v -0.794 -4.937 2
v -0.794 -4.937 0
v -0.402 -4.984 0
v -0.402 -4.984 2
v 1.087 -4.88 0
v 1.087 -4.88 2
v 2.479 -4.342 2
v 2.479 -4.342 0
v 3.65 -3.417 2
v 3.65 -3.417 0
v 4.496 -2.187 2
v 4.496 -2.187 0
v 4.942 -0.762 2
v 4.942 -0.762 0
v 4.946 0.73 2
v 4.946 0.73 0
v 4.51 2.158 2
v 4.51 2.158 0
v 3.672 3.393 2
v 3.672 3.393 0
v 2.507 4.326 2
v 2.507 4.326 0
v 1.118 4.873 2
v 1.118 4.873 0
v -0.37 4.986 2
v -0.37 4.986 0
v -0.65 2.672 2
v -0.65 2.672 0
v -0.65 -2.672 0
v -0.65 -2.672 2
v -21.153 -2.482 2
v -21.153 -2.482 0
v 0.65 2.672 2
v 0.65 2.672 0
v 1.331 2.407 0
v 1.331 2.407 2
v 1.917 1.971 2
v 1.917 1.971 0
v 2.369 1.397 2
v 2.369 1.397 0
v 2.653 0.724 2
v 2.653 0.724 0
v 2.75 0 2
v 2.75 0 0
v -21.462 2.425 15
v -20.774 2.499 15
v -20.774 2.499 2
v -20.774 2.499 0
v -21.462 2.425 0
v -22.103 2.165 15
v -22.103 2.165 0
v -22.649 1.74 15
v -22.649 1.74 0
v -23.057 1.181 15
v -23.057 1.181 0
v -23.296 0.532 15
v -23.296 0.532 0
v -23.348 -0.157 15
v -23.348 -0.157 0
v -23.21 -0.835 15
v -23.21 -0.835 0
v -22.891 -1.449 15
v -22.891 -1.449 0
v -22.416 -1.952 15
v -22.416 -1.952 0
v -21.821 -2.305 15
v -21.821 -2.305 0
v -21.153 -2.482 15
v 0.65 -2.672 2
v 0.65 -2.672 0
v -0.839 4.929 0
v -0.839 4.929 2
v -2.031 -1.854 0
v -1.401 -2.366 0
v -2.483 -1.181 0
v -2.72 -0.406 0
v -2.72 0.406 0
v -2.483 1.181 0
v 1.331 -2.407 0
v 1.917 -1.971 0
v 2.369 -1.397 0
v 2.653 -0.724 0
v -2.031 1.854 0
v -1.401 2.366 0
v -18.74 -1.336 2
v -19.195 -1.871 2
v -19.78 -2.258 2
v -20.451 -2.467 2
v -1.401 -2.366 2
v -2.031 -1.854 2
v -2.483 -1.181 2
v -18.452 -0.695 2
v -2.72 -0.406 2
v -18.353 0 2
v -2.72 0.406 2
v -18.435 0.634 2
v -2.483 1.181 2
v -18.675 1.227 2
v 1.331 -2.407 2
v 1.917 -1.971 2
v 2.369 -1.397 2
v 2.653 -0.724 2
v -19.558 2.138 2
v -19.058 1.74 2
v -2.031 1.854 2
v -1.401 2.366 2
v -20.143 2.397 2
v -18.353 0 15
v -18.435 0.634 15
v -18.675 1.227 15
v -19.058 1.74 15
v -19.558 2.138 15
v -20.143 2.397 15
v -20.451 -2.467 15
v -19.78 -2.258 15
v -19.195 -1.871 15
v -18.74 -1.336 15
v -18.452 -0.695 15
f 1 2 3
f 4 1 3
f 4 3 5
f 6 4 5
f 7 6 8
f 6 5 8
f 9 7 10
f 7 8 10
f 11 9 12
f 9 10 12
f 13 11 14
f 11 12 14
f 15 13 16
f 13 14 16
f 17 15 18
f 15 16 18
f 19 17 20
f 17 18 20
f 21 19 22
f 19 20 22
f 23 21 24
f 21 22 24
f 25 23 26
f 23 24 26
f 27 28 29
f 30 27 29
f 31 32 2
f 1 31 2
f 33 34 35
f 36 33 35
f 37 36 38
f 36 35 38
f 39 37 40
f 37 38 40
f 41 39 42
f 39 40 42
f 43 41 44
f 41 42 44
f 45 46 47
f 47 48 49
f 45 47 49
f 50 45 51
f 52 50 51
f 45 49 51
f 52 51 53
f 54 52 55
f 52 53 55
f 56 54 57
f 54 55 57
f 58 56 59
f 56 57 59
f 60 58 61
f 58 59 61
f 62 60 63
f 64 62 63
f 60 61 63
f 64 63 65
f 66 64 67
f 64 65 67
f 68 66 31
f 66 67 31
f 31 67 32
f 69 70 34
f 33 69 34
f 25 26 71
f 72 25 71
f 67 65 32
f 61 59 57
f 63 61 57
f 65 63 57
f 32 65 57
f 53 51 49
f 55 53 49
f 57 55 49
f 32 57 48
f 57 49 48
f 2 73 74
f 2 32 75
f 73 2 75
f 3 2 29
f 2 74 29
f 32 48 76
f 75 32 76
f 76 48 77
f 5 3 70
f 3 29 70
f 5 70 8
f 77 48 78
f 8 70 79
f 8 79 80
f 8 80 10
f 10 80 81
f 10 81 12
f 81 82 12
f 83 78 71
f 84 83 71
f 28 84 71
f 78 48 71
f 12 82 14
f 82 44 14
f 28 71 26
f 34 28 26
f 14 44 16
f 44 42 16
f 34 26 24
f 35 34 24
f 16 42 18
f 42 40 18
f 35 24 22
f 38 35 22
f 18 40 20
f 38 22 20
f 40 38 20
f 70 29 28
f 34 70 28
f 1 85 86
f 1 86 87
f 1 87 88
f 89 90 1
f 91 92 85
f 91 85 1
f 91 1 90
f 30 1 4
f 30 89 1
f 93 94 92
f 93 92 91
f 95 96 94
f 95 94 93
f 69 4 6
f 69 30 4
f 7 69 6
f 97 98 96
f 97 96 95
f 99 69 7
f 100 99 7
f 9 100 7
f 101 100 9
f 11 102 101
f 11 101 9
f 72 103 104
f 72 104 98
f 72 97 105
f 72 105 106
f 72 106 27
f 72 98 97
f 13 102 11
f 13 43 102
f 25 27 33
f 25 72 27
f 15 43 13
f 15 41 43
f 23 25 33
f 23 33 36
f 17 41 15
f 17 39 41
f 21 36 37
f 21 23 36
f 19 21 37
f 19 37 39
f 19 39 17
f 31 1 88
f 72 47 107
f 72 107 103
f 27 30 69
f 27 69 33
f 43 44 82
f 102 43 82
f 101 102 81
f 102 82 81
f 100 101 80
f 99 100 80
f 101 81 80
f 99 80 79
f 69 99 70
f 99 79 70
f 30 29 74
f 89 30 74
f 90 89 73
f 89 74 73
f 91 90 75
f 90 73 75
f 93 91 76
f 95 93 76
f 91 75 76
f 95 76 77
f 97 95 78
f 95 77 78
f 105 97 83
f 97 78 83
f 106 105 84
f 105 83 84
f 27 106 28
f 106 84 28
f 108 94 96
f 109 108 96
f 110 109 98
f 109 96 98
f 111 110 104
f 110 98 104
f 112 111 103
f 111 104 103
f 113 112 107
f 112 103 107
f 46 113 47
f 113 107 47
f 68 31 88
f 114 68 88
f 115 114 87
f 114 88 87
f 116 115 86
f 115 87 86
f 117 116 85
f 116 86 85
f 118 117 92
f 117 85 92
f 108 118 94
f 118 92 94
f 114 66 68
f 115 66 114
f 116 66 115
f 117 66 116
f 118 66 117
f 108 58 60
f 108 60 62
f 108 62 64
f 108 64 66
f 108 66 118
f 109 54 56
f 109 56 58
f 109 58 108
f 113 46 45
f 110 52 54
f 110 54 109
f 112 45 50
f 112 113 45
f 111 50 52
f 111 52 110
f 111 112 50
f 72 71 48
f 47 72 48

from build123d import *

# Parameters (mm, degrees)
F1_DEPTH = 15
F2_DEPTH = 2


with BuildPart() as f1:
    # F0 (on Top) → F1 (new body)
    with BuildSketch(Plane.XY):
        with BuildLine():
            ThreePointArc((-20.774407, 2.498756), (-23.346099, 0.18924), (-21.152519, -2.482026))
            ThreePointArc((-21.152519, -2.482026), (-19.194675, -1.870577), (-18.353272, 0))
            ThreePointArc((-18.353272, 0), (-19.057839, 1.739661), (-20.774407, 2.498756))
        make_face()
    extrude(amount=F1_DEPTH)

    # F0 (on Top) → F2 (join)
    with BuildSketch(Plane.XY):
        with BuildLine():
            Line((-21.152519, -2.482026), (-0.793802, -4.936586))
            Line((-0.793802, -4.936586), (-0.402254, -4.983793))
            ThreePointArc((-0.402254, -4.983793), (4.999974, -0.016188), (-0.369976, 4.986293))
            Line((-0.369976, 4.986293), (-0.83883, 4.929134))
            Line((-0.83883, 4.929134), (-20.774407, 2.498756))
            ThreePointArc((-20.774407, 2.498756), (-19.057839, 1.739661), (-18.353272, 0))
            ThreePointArc((-18.353272, 0), (-19.194675, -1.870577), (-21.152519, -2.482026))
        make_face()
        with BuildLine():
            ThreePointArc((0.65, 2.672078), (2.162175, 1.699265), (2.75, 0))
            ThreePointArc((2.75, 0), (2.162175, -1.699265), (0.65, -2.672078))
            ThreePointArc((0.65, -2.672078), (0, -2.75), (-0.65, -2.672078))
            ThreePointArc((-0.65, -2.672078), (-2.75, 0), (-0.65, 2.672078))
            ThreePointArc((-0.65, 2.672078), (0, 2.75), (0.65, 2.672078))
        make_face(mode=Mode.SUBTRACT)
        with BuildLine():
            Line((0.65, -2.672078), (0.65, 2.672078))
            ThreePointArc((0.65, 2.672078), (0, 2.75), (-0.65, 2.672078))
            Line((-0.65, 2.672078), (-0.65, -2.672078))
            ThreePointArc((-0.65, -2.672078), (0, -2.75), (0.65, -2.672078))
        make_face()
    extrude(amount=F2_DEPTH)


solid = f1.part
